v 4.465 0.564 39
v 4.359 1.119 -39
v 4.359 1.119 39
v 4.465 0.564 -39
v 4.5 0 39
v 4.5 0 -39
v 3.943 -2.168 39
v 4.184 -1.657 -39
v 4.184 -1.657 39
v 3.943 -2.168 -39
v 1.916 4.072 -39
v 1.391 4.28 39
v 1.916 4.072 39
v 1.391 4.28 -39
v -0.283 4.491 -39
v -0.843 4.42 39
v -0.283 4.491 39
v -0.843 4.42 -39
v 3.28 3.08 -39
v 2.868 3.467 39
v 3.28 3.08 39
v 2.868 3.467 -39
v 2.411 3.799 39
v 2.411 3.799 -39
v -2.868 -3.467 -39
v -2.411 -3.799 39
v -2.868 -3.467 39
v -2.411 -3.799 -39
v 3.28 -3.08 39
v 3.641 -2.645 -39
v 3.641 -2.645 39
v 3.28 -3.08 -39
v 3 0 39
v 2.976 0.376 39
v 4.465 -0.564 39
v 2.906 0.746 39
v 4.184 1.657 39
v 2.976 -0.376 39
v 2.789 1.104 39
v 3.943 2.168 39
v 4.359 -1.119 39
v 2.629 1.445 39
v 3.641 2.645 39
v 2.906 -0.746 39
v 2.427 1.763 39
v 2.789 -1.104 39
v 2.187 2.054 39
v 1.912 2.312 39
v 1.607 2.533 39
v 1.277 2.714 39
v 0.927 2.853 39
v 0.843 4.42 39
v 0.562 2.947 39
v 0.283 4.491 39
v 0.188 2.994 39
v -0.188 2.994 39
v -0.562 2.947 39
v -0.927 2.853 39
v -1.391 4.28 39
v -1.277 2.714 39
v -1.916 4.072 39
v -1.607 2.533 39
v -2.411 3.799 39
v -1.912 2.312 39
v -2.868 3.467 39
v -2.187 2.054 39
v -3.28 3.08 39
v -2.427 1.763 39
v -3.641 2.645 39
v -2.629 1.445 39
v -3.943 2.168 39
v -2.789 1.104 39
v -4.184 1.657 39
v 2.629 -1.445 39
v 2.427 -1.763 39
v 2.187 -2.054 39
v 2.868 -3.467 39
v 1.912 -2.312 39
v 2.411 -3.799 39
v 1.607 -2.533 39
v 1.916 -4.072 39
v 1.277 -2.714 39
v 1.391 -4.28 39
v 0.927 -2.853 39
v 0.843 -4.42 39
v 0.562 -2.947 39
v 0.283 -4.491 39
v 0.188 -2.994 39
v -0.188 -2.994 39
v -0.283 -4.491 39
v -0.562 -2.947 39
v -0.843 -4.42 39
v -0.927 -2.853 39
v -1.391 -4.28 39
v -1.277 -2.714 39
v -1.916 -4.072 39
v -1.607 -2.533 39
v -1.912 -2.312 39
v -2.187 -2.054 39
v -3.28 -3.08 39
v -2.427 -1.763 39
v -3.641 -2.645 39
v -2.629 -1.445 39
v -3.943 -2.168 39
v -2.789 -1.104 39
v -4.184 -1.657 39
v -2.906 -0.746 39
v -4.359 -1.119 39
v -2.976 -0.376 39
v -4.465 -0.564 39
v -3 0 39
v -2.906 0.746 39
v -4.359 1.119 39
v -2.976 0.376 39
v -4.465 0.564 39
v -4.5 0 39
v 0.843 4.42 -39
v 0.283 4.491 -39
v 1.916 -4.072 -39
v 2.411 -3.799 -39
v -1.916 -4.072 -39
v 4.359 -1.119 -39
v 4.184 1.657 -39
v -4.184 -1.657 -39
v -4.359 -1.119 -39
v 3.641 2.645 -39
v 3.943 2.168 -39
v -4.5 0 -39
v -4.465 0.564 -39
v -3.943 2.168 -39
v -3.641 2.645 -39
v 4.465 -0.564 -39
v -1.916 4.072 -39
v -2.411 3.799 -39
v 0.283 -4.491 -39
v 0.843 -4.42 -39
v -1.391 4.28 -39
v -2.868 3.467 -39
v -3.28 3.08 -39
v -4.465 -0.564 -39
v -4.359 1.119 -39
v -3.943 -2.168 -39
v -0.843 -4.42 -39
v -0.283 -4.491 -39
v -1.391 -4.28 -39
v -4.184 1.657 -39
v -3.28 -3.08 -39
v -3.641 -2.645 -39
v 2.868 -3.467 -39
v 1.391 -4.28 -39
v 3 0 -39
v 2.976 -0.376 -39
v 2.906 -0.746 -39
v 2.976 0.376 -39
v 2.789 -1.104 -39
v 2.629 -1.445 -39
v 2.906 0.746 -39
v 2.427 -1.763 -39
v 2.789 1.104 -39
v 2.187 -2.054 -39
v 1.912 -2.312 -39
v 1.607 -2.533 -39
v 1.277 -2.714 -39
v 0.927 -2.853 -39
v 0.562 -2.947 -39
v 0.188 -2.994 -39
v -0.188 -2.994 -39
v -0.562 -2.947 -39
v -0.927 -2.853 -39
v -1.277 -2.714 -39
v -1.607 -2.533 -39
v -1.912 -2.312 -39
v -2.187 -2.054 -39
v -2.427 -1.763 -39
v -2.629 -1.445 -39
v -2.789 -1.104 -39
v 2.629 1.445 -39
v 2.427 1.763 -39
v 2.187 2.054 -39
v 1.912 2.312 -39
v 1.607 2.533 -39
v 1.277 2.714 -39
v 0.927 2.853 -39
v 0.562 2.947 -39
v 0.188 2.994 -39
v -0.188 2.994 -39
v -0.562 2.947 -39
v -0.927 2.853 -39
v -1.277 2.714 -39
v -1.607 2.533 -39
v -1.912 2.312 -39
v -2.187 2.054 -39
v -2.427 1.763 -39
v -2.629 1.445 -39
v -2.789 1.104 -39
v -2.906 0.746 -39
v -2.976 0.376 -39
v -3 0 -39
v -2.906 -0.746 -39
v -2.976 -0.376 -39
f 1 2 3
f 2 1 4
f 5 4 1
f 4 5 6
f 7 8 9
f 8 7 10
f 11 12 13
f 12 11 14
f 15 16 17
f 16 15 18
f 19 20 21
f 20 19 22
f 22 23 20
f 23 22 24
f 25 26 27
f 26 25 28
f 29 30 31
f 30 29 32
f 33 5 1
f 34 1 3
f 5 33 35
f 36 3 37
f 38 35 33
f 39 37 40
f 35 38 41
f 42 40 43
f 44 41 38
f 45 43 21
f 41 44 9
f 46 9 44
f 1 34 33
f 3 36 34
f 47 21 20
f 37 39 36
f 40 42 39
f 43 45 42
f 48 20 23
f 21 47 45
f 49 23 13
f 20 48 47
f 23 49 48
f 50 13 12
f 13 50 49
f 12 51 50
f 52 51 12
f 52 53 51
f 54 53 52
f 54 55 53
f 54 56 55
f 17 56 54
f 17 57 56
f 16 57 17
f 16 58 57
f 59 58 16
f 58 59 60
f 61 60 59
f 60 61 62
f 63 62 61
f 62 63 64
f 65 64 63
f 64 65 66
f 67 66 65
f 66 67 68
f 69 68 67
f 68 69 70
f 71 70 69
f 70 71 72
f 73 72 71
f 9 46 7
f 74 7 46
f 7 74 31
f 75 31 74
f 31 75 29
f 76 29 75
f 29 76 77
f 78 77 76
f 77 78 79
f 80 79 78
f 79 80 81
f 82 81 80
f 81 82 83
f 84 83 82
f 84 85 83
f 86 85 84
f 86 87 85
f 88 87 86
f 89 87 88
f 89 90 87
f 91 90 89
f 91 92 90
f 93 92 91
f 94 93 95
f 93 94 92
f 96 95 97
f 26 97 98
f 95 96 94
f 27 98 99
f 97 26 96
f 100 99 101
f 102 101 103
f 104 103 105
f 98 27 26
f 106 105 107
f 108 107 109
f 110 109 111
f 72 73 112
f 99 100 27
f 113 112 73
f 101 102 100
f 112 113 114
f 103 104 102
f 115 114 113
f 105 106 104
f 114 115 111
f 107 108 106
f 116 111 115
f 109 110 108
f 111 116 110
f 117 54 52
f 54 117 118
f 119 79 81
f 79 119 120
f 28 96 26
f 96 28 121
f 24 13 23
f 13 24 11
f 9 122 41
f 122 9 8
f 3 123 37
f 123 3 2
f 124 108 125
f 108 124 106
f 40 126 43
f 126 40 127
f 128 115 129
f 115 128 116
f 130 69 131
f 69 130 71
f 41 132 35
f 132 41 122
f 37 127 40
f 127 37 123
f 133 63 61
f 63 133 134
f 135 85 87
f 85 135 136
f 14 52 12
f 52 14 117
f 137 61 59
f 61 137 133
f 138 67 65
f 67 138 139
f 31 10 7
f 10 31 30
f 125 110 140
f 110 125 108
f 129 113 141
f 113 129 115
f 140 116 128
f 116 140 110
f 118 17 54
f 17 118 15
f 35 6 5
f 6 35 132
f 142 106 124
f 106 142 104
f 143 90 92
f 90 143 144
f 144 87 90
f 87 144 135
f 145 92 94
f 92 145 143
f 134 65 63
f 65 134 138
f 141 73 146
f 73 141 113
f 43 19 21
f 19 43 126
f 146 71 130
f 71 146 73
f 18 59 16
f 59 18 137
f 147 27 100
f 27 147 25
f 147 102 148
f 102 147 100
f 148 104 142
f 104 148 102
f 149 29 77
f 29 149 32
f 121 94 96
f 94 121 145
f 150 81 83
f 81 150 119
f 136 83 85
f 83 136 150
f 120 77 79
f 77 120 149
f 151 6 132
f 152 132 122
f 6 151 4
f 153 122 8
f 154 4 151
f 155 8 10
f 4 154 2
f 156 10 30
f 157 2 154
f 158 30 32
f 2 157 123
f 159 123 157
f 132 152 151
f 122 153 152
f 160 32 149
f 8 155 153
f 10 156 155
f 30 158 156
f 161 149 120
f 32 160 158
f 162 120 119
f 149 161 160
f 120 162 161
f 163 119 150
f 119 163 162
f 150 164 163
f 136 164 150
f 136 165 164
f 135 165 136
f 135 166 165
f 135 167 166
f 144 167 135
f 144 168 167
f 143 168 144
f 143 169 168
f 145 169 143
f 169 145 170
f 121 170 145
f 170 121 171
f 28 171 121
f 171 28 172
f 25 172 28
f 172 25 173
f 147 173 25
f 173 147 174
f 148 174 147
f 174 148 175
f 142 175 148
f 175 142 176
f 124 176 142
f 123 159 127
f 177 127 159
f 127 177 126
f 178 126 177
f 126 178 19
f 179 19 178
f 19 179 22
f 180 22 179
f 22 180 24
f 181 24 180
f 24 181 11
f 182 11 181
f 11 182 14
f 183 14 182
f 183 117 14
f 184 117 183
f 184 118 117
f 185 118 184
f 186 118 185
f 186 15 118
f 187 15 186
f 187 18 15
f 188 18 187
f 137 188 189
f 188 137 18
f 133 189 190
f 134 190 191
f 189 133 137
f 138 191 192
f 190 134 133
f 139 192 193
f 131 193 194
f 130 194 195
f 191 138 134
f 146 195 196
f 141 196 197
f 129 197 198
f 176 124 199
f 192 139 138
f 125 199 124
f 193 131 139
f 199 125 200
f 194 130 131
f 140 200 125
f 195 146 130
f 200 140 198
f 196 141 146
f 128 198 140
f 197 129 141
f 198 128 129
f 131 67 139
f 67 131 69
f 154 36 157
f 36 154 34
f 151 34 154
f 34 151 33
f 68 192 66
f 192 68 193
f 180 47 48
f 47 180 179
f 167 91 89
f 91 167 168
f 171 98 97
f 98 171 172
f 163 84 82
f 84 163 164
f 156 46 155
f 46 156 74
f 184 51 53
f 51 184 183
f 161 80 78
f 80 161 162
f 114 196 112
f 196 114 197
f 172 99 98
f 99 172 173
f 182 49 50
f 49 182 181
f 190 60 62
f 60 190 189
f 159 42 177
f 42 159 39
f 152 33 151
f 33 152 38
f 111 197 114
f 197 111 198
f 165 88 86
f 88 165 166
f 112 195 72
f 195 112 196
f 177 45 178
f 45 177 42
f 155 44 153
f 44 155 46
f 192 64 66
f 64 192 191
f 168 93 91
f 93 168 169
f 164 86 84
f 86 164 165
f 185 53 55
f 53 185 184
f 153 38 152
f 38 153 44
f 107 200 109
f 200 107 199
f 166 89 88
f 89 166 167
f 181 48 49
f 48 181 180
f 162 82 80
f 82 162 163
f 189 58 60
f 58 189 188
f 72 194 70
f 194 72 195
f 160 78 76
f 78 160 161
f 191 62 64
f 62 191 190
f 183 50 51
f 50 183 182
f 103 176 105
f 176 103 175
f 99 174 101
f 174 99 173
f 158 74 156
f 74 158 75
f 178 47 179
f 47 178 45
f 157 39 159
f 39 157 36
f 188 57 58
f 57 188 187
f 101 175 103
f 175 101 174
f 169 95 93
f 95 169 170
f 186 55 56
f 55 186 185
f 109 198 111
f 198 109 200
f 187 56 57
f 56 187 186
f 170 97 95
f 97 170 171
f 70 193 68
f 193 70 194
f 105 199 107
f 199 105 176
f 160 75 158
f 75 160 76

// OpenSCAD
$fn = 50;


difference() {
	union() {
		translate(v = [0, 0, -39.0000000000]) {
			cylinder(h = 78, r = 4.5000000000);
		}
	}
	union() {
		translate(v = [0, 0, -100.0000000000]) {
			cylinder(h = 200, r = 3.0000000000);
		}
	}
}
